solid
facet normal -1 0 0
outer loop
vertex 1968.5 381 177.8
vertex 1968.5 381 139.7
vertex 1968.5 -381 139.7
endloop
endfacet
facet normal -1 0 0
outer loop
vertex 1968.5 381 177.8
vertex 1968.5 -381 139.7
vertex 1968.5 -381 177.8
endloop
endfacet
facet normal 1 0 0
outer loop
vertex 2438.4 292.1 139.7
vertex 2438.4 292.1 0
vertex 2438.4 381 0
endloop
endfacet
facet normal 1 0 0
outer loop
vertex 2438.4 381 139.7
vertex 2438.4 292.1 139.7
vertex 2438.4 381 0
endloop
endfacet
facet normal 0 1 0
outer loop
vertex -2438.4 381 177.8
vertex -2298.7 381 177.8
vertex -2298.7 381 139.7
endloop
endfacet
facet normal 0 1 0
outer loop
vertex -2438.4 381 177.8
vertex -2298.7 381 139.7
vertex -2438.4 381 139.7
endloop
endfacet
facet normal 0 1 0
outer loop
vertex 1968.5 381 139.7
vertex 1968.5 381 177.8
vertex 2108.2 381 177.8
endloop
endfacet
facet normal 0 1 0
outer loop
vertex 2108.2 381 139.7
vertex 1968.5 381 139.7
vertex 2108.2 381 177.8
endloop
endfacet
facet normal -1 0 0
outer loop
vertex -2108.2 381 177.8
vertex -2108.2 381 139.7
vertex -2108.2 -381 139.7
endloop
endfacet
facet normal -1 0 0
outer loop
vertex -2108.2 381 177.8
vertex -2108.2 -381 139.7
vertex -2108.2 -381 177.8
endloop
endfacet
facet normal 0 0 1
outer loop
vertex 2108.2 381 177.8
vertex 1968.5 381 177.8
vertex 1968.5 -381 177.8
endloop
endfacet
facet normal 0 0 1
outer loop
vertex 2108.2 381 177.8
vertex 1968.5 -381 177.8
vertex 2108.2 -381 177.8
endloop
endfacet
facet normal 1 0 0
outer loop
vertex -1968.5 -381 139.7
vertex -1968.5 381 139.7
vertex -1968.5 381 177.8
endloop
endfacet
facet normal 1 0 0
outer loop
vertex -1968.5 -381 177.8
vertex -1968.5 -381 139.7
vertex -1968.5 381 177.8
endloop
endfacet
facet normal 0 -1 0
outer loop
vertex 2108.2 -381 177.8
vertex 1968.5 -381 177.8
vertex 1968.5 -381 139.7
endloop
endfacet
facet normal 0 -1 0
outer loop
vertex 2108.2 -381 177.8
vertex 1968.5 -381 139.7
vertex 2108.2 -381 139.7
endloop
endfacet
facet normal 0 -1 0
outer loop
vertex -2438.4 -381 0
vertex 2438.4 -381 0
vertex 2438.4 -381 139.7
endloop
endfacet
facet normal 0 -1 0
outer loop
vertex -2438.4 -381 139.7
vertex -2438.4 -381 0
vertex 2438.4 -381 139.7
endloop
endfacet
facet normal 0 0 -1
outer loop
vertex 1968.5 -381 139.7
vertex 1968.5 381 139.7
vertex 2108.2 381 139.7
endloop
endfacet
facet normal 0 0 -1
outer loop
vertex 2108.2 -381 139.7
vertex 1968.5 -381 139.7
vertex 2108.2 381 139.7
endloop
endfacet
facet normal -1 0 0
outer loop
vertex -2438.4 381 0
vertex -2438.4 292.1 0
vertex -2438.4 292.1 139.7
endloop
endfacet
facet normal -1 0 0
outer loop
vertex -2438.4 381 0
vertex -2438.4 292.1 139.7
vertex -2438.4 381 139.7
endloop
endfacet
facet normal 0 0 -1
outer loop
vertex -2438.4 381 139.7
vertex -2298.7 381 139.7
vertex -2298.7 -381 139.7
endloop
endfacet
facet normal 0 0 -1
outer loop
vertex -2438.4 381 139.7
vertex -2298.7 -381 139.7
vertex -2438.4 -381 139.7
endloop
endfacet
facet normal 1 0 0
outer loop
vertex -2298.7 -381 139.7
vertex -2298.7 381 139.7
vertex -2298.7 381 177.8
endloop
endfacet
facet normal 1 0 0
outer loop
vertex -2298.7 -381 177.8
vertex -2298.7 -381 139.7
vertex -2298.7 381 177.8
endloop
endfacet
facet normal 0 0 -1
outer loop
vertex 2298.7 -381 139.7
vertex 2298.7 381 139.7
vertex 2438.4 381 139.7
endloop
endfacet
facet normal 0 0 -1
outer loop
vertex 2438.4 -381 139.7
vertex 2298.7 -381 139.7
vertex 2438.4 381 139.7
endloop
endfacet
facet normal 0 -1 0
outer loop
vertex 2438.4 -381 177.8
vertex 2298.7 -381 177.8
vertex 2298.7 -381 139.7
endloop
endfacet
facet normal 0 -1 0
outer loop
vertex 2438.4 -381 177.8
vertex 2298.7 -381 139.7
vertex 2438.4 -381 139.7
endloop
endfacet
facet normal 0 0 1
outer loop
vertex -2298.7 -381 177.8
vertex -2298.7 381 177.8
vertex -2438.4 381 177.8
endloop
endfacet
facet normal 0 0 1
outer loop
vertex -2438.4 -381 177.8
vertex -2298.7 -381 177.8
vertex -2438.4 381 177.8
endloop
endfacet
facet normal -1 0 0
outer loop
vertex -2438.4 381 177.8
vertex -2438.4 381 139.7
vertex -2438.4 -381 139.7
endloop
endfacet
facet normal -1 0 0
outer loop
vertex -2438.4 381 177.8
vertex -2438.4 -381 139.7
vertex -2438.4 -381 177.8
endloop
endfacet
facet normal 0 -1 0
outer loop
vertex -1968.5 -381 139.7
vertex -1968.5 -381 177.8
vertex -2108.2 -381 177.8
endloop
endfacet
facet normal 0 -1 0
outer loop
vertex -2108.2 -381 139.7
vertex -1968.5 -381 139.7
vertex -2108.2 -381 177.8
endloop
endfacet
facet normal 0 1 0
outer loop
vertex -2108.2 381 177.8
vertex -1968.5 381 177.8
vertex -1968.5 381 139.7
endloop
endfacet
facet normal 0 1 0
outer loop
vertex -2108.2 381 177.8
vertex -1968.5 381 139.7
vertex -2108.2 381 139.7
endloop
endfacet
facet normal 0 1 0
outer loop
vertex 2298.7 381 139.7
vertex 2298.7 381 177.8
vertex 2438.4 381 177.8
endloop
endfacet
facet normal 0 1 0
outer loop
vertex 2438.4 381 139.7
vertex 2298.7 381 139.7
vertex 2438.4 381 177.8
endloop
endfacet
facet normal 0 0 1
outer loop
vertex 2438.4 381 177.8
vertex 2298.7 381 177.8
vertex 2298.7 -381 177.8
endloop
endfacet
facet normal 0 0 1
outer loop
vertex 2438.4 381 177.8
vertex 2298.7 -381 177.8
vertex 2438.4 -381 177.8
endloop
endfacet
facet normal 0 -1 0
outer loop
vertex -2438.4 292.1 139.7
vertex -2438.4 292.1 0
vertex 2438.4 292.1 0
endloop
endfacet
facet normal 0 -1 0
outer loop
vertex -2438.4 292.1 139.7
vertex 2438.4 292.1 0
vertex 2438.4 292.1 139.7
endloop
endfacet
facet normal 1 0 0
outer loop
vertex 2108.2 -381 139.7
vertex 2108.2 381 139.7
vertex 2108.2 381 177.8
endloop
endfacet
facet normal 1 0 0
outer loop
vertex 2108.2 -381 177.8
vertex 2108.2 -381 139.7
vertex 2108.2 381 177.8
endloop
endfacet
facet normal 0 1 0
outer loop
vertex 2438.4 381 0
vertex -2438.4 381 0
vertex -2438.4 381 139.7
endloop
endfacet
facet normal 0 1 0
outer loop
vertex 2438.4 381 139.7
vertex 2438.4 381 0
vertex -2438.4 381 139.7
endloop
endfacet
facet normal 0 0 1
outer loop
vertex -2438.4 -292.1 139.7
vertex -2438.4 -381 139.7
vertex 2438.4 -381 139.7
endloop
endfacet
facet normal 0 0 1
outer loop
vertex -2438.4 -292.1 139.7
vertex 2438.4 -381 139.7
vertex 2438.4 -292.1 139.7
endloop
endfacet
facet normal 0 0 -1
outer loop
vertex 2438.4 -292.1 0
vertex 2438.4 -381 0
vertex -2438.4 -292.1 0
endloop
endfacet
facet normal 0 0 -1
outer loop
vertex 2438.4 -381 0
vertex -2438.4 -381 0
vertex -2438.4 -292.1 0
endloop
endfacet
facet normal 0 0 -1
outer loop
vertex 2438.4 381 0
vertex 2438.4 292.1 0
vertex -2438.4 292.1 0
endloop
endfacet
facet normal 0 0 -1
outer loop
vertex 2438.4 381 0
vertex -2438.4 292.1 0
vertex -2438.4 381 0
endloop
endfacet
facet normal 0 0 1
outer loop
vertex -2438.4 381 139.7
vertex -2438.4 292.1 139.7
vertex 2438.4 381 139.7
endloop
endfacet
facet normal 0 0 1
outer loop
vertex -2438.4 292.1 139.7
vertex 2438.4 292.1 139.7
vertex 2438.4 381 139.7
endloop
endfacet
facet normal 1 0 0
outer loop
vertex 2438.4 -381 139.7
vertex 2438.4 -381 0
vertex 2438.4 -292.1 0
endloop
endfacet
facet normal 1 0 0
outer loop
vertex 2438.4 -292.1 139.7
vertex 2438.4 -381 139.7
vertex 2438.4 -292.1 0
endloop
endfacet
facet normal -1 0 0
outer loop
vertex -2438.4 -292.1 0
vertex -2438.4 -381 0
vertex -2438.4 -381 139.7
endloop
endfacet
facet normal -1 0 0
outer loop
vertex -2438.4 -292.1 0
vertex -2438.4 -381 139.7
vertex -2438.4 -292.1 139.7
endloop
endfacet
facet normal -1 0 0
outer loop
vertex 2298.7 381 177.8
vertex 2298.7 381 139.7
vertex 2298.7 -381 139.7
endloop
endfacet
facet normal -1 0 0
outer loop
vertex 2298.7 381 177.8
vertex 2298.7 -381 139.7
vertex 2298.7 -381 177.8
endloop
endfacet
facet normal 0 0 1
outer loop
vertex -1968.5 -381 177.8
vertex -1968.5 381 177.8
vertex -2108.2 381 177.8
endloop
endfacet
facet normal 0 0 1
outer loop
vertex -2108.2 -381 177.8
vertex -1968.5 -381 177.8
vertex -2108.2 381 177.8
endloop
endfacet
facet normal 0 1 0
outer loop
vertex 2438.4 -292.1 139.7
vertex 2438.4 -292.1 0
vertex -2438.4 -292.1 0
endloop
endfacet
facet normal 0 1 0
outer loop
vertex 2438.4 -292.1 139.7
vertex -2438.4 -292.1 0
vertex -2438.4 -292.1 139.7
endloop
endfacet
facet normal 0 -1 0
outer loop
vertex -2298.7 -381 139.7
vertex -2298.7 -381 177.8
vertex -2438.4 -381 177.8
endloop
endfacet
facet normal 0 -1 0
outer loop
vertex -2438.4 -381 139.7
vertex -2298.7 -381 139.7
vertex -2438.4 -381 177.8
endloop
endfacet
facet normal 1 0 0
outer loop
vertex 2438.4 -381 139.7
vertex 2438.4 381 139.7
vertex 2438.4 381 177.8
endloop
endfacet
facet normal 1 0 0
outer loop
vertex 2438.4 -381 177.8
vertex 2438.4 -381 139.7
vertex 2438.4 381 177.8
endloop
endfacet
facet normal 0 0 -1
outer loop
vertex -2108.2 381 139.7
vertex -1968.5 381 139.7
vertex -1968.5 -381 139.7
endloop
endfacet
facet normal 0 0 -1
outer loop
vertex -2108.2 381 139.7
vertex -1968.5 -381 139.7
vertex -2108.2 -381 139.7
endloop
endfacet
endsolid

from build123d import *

# Parameters (mm, degrees)
F0_W     = 88.9
F0_H     = 139.7
F1_DEPTH = 2438.4
F2_W     = 139.7
F2_H     = 38.1
F3_DEPTH = 762


with BuildPart() as f1:
    # F0 (on Right) → F1 (new body, symmetric)
    with BuildSketch(Plane.YZ):
        with Locations((-336.55, 69.85)):
            Rectangle(F0_W, F0_H)
        with Locations((336.55, 69.85)):
            Rectangle(F0_W, F0_H)
    extrude(amount=F1_DEPTH, both=True)


with BuildPart() as f3:
    # F2 (on face) → F3 (new body)
    with BuildSketch(Plane.XZ.offset(381)):
        with Locations((2368.55, 158.75)):
            Rectangle(F2_W, F2_H)
        with Locations((2038.35, 158.75)):
            Rectangle(F2_W, F2_H)
    extrude(amount=-F3_DEPTH)


with BuildPart() as f4_1:
    # F4: instance of F3
    add(f3.part.mirror(Plane.YZ))


solid = Compound([f1.part, f3.part, f4_1.part])
